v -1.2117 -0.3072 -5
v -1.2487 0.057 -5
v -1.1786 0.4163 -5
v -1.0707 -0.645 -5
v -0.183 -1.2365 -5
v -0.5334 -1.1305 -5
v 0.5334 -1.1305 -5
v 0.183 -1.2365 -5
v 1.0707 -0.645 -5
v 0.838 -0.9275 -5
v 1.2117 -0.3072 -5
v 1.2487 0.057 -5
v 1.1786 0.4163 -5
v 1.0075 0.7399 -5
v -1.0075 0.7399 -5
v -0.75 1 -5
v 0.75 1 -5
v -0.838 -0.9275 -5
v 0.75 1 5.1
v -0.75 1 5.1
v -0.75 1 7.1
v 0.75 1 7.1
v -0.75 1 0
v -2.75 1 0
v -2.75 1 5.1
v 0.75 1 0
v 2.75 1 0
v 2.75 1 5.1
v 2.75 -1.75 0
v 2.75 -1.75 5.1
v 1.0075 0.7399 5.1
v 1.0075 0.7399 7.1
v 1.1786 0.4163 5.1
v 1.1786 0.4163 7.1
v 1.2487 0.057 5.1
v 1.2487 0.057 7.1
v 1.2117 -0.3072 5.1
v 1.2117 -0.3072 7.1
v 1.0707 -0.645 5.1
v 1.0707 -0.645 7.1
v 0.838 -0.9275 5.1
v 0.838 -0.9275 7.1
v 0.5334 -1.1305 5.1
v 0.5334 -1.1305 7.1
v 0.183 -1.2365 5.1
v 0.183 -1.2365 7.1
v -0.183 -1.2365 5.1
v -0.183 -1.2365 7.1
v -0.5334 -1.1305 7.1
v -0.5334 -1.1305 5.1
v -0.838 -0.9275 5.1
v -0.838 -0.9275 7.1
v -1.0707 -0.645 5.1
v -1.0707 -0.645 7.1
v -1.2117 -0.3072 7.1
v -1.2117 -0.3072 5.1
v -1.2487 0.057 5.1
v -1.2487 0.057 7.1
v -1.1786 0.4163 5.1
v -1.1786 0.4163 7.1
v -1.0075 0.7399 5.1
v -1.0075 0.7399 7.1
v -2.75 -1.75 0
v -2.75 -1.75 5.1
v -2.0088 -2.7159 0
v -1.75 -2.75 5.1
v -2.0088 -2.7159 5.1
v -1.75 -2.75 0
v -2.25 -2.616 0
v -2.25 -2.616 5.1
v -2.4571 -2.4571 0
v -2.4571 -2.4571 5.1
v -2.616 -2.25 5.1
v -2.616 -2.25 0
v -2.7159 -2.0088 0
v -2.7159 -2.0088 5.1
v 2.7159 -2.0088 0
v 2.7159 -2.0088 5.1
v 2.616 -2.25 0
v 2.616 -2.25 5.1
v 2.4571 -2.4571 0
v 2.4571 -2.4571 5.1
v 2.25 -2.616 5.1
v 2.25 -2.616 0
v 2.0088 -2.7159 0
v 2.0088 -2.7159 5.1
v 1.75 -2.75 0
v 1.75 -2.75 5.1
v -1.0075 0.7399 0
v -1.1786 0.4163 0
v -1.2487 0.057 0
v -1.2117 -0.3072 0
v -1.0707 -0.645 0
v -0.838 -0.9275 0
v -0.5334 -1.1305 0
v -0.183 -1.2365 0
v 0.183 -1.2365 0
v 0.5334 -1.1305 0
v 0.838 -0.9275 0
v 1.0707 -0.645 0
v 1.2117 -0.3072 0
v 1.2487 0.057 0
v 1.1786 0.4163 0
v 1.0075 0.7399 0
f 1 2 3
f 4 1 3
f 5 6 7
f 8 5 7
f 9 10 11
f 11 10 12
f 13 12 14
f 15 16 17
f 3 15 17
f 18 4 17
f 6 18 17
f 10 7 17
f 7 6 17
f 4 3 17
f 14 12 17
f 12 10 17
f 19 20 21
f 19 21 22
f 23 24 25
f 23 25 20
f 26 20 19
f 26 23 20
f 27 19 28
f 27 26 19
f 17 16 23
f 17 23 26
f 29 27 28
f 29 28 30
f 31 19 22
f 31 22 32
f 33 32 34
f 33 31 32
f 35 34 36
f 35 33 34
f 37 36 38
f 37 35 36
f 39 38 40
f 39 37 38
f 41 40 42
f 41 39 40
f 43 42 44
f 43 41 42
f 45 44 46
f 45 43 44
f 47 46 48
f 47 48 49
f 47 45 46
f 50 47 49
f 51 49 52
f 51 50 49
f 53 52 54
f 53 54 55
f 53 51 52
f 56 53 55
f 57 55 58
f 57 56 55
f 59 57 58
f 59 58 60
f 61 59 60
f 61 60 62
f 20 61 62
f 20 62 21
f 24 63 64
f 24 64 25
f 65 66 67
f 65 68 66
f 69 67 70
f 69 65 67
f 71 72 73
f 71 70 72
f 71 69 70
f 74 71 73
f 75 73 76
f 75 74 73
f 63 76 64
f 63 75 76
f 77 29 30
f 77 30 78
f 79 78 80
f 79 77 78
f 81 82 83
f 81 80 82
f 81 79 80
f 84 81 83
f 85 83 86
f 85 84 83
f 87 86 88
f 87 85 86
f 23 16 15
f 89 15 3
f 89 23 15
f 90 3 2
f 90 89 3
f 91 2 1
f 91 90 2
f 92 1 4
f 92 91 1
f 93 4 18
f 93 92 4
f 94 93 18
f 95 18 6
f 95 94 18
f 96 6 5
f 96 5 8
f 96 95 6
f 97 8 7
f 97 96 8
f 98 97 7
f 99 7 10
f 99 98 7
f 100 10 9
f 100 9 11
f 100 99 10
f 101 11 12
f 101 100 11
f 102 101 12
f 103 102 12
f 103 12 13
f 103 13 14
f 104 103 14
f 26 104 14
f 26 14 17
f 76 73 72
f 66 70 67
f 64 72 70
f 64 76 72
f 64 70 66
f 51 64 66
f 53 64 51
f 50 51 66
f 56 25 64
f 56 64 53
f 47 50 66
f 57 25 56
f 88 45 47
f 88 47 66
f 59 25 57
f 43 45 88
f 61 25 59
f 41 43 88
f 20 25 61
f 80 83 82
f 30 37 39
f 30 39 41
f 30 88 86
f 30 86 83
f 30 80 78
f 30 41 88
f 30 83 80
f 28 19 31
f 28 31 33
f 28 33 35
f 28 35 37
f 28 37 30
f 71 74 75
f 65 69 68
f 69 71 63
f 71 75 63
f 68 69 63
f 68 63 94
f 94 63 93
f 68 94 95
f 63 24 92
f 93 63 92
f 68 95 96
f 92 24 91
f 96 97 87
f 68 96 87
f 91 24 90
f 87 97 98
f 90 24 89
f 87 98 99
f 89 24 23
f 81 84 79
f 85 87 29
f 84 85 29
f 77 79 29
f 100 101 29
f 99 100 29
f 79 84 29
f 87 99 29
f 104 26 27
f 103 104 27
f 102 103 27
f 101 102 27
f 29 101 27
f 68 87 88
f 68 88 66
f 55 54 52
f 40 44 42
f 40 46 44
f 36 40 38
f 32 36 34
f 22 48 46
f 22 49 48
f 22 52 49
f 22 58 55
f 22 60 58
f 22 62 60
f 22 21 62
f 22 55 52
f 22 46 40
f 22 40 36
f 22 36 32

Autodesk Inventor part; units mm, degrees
ref_plane "YZ Plane" through (0, 0, 0) normal (1, 0, 0) x (0, 1, 0)
ref_plane "XZ Plane" through (0, 0, 0) normal (0, 1, 0) x (-1, 0, 0)
ref_plane "XY Plane" through (0, 0, 0) normal (0, 0, 1) x (1, 0, 0)
sketch "Sketch1" plane through (0, 0, 0) normal (0, 0, 1) x (1, 0, 0)
  circle A0 centre (0, 0) radius 1.25
  circle A1 centre (0, 0) radius 2.75
  line L0 (-1.75, 2.75) -> (1.75, 2.75)
  line L1 (2.75, 1.75) -> (2.75, -1.75)
  line L2 (1.75, -2.75) -> (-1.75, -2.75)
  line L3 (-2.75, -1.75) -> (-2.75, 1.75)
  arc A2 (-1.75, 2.75) -> (-2.75, 1.75) centre (-1.75, 1.75) ccw
  arc A3 (2.75, 1.75) -> (1.75, 2.75) centre (1.75, 1.75) ccw
  arc A4 (1.75, -2.75) -> (2.75, -1.75) centre (1.75, -1.75) ccw
  arc A5 (-2.75, -1.75) -> (-1.75, -2.75) centre (-1.75, -1.75) ccw
  line L4 (-2.75, 1) -> (2.75, 1)
  point P0 (-2.75, 0)
  point P1 (0, -2.75)
  point P2 (0.75, 1)
  point P3 (-0.75, 1)
  dimension "d0" = 2.5
  dimension "d1" = 5.5
  dimension "d2" = 1
  dimension "d3" = 1
  dimension "d4" = 1
  dimension "d11" = 1
extrude "Extrusion1" add sketch "Sketch1" against normal blind 5 contours A0 L4 picked at (0.7457, -0.3378)
extrude "Extrusion2" add sketch "Sketch1" along normal blind 5.1 contours A0 L4 | A0 L4 A1 | L4 L1 A1 | A1 L3 L4 | L1 A4 L2 A1 | A1 L2 A5 L3 picked at (0.7457, -0.3378) picked at (2.227, -0.204)
extrude "Extrusion3" add sketch "Sketch1" along normal blind 7.1 contours A0 L4 picked at (0.7457, -0.3378)
properties part number "rpi_base_front_3DPrint"
